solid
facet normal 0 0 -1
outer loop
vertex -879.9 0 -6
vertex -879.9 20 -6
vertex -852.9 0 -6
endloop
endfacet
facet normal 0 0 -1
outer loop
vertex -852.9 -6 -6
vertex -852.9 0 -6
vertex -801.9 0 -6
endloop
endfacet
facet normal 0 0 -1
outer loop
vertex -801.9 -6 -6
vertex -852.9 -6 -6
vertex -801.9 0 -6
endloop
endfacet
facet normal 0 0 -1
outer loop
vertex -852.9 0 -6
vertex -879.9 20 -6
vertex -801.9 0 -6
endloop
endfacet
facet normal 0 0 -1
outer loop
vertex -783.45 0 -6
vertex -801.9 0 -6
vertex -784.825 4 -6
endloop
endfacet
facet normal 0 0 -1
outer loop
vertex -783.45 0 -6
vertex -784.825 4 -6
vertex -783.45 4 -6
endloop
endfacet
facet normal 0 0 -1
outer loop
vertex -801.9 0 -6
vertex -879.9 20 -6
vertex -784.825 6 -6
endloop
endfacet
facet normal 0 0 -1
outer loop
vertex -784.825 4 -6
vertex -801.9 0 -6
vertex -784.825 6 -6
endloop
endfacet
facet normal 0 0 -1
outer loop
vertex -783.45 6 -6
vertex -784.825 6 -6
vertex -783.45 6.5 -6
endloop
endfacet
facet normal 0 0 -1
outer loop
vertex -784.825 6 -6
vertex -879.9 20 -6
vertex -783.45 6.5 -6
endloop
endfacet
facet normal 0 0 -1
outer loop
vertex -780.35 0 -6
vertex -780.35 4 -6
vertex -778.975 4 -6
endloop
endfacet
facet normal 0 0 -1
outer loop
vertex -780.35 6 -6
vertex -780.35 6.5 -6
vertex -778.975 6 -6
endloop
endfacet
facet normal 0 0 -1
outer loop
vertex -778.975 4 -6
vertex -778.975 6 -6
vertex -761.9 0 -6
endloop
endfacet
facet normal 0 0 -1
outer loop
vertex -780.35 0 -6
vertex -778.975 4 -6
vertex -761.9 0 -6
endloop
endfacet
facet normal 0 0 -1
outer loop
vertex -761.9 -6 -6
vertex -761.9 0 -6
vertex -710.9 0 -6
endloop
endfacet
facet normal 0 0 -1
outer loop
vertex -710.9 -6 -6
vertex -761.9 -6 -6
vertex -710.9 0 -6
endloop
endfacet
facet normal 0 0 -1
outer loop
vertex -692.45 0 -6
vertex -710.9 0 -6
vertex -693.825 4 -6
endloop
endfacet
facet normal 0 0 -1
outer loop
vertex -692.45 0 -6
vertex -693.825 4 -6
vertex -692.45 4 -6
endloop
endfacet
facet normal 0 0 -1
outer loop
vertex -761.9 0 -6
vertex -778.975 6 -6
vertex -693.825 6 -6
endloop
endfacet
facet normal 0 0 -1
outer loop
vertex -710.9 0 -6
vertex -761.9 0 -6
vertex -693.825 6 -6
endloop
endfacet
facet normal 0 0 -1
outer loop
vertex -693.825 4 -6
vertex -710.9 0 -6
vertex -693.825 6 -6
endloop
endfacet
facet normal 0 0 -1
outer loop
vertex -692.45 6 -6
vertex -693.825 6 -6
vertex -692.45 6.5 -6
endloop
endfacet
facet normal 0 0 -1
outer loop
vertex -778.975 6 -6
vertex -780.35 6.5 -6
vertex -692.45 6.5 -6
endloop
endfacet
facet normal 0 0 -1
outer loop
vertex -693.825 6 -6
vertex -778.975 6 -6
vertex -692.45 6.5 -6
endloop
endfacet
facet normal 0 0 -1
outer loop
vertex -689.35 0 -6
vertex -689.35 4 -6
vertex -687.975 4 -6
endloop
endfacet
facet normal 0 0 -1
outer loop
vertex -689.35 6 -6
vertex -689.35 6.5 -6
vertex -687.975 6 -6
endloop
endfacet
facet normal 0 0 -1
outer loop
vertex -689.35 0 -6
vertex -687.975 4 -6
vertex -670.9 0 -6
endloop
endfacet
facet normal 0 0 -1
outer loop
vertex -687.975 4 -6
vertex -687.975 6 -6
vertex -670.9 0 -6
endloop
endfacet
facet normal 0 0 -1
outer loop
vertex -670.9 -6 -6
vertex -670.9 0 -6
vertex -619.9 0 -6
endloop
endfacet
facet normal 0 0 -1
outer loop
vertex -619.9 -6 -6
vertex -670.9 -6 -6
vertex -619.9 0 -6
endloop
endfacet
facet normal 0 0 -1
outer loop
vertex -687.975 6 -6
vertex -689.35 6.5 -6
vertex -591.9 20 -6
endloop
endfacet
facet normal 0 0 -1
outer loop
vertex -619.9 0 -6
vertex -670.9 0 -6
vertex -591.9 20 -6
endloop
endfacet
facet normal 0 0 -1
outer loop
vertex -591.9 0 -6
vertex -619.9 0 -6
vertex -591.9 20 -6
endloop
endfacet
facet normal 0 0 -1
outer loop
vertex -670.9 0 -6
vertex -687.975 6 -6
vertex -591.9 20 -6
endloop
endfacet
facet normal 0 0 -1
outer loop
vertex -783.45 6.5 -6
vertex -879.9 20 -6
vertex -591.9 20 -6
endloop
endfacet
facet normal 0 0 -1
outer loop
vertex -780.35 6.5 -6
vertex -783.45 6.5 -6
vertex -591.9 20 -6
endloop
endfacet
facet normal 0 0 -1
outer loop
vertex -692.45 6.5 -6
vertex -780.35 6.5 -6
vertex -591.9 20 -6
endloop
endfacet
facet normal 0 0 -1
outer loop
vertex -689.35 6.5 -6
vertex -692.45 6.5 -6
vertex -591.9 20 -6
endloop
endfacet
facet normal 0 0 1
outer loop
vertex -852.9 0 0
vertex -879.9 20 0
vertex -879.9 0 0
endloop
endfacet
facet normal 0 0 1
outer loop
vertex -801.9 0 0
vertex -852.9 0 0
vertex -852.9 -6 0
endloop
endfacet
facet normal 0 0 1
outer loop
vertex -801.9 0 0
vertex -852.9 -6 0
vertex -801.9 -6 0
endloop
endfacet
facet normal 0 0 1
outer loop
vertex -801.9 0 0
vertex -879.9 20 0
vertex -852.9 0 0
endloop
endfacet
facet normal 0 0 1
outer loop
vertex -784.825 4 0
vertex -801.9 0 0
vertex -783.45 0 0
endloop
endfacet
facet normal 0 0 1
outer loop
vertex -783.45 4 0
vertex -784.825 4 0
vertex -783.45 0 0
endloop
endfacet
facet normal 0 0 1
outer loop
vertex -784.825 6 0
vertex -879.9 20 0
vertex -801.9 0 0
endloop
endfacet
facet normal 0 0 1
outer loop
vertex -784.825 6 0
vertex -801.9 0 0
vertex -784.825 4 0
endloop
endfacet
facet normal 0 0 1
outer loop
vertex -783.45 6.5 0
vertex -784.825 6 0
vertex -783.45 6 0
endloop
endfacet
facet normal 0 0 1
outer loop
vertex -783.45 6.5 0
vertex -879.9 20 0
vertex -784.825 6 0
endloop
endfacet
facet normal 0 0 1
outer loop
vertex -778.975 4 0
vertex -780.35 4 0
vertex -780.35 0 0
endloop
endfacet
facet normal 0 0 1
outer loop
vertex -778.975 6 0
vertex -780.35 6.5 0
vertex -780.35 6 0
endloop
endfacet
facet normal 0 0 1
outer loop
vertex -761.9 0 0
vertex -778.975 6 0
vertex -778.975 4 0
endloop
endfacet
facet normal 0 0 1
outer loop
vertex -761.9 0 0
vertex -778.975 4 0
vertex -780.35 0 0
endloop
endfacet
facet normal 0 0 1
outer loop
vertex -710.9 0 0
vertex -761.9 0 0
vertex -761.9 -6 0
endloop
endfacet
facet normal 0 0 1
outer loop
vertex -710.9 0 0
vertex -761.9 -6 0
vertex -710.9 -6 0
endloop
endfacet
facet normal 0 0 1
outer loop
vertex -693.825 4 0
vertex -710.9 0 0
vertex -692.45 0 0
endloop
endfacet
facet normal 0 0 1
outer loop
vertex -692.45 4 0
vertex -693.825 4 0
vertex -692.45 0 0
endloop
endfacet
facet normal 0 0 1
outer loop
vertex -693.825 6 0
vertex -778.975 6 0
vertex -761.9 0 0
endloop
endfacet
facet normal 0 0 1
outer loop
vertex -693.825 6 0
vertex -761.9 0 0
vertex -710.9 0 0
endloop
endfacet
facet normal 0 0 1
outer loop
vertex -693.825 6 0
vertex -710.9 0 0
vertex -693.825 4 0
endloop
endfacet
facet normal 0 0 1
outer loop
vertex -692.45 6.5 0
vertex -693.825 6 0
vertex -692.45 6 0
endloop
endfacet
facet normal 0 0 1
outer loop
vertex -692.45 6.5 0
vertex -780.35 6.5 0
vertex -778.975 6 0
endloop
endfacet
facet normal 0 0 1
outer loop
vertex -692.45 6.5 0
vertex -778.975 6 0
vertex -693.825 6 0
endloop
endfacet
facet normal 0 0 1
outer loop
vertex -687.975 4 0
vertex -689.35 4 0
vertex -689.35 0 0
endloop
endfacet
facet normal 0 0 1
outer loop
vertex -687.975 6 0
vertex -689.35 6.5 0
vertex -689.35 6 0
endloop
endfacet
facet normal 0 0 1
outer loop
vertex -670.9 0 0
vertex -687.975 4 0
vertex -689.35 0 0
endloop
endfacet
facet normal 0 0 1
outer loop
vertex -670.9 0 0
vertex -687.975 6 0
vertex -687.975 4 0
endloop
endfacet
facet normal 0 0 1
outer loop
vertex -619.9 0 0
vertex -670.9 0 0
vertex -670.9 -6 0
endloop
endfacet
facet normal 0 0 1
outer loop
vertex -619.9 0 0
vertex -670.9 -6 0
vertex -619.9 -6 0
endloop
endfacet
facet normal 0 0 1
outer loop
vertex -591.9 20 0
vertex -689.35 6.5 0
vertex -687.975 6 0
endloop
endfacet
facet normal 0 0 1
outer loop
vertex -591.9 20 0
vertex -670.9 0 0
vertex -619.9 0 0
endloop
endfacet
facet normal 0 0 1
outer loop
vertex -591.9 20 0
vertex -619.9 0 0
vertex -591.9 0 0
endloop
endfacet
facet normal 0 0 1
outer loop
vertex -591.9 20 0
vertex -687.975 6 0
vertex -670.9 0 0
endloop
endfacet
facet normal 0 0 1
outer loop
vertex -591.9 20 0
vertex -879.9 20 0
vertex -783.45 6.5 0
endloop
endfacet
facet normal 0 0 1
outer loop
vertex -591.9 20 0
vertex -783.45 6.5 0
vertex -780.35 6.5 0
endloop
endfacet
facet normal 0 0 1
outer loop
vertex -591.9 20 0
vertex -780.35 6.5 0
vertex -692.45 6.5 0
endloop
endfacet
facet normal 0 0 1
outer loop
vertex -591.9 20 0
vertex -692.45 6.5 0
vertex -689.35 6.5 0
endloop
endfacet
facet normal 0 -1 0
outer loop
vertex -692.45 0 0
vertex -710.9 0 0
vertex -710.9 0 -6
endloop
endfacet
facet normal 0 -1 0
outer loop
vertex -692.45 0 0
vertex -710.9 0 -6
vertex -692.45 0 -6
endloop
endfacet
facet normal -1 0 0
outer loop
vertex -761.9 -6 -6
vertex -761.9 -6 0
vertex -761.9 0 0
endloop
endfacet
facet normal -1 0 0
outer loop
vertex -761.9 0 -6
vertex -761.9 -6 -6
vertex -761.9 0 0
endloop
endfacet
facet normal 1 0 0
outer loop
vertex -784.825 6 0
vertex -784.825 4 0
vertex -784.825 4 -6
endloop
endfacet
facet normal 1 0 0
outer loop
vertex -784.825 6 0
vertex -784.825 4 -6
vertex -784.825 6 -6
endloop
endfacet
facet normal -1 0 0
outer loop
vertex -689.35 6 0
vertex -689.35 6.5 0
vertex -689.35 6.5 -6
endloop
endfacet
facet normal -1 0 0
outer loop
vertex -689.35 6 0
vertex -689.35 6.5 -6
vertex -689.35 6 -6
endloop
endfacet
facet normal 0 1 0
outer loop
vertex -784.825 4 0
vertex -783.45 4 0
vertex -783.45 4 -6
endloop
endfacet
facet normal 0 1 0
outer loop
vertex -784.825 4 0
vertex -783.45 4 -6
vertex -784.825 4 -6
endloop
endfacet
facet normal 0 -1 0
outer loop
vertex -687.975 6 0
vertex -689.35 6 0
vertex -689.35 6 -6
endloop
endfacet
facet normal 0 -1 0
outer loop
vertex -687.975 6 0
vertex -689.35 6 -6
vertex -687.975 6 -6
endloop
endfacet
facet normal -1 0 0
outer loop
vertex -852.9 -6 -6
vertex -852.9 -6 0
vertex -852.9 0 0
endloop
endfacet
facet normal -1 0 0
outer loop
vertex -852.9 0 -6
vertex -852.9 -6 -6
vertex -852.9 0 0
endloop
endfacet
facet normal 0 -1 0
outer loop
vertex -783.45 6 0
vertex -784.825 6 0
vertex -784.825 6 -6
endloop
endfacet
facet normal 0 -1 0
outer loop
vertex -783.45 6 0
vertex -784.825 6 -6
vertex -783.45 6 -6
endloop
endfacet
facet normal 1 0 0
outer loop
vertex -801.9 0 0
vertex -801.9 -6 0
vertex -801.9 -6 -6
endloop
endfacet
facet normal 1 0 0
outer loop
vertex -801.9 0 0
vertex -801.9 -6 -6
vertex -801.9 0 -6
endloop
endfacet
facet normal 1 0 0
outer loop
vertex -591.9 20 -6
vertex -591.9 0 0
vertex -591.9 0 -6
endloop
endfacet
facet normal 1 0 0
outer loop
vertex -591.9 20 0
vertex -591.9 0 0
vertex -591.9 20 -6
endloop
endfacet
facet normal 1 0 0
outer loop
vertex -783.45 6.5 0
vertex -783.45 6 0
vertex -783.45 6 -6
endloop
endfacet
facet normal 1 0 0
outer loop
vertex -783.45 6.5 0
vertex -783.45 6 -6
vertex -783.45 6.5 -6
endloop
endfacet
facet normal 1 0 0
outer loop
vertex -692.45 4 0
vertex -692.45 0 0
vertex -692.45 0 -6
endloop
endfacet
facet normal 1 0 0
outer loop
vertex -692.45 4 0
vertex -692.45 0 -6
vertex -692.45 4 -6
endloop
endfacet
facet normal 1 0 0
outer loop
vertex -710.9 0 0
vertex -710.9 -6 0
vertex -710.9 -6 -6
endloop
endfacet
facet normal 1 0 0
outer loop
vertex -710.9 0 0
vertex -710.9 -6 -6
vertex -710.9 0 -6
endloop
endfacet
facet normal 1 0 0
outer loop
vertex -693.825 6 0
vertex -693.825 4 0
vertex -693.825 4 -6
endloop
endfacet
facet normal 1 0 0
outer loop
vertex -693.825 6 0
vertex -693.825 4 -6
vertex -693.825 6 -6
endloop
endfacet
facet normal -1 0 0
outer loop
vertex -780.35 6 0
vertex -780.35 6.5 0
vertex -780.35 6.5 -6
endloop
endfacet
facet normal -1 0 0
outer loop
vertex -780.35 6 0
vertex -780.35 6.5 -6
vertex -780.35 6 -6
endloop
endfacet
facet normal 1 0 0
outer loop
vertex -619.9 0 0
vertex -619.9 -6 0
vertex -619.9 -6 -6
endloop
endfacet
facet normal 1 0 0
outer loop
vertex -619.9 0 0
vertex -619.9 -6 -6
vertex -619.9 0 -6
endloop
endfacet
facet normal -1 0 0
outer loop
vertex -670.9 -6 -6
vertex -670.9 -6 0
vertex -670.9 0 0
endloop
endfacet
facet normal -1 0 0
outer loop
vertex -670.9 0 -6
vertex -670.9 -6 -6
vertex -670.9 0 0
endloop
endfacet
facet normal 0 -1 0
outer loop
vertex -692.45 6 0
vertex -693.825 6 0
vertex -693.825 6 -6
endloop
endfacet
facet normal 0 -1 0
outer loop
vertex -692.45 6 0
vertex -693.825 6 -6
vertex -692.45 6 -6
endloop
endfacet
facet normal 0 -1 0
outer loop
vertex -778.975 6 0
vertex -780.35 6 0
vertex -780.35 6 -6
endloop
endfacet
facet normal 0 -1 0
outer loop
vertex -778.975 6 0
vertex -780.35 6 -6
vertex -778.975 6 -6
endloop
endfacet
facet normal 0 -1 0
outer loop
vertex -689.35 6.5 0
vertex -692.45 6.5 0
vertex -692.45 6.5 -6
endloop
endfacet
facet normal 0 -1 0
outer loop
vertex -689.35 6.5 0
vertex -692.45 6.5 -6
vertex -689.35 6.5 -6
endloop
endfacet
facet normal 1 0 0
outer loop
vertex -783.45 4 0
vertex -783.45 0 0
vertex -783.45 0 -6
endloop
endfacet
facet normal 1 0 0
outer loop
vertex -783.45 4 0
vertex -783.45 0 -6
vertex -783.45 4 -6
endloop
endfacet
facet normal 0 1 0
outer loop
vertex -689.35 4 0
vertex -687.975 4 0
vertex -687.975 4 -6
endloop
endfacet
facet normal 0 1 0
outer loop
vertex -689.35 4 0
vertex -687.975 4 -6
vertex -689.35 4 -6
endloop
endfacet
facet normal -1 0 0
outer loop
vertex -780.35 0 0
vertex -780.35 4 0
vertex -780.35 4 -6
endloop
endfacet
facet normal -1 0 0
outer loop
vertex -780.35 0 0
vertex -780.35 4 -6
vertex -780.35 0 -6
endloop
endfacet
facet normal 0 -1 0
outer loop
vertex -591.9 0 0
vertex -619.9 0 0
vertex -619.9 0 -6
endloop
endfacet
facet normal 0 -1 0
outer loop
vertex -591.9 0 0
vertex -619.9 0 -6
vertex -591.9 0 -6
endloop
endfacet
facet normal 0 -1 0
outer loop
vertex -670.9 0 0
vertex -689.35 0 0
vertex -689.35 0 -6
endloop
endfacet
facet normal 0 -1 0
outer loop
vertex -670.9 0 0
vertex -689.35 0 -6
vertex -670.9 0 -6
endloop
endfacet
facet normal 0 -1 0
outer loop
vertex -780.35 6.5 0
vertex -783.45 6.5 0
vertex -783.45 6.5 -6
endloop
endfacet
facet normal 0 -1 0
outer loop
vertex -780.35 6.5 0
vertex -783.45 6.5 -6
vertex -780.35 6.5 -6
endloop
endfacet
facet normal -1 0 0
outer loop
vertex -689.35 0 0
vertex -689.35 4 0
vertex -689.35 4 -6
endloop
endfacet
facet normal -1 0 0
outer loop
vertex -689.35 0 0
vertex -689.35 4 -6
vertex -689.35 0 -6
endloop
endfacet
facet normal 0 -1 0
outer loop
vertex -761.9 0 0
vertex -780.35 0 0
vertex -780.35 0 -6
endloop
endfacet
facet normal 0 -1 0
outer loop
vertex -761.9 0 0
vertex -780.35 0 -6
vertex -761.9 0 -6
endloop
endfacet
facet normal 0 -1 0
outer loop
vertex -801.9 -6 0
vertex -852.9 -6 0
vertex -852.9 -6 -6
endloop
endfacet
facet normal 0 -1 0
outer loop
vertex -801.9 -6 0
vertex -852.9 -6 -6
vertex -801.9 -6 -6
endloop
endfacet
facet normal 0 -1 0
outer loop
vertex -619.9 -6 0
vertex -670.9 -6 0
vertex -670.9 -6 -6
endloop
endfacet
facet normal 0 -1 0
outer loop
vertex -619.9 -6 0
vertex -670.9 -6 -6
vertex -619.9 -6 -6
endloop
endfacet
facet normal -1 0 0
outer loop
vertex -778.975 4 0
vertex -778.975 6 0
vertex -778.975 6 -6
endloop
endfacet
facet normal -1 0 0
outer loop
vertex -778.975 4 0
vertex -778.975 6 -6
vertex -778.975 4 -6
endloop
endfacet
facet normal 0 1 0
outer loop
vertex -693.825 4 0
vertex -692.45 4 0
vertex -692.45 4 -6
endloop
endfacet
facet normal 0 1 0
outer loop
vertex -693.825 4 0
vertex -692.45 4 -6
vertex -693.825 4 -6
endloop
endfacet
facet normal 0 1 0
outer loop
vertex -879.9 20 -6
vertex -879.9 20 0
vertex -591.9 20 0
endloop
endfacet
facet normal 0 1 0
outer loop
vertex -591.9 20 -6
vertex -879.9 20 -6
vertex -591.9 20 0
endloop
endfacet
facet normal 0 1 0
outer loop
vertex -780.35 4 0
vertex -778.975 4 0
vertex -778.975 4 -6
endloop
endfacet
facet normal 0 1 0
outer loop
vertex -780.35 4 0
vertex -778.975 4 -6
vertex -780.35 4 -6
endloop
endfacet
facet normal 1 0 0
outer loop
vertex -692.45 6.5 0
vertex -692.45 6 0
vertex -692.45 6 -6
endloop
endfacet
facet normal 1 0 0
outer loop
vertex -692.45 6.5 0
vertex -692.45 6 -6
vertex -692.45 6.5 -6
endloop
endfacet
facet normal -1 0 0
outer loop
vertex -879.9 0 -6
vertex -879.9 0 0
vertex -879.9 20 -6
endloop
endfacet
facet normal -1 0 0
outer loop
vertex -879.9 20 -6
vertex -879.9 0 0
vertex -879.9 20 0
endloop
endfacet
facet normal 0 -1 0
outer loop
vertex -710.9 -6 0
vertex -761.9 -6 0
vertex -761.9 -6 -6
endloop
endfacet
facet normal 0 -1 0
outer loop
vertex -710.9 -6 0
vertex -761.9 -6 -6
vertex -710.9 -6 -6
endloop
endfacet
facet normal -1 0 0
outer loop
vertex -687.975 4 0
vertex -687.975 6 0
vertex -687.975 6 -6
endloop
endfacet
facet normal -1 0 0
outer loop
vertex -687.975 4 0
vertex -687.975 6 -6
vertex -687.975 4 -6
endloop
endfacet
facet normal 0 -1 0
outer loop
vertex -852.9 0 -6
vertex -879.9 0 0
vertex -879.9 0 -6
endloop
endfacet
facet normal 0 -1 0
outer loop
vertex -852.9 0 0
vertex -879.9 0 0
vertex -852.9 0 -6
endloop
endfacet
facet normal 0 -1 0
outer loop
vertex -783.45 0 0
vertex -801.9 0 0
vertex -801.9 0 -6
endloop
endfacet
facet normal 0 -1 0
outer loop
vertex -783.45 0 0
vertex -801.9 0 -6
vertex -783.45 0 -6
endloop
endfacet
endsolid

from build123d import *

# Parameters (mm, degrees)
SZKIC1_W                    = 288
SZKIC1_H                    = 26
DODANIE_WYCI_GNI_CIE1_DEPTH = 6
SZKIC5_W                    = 40
SZKIC5_H                    = 6
WYTNIJ_WYCI_GNI_CIE3_DEPTH  = 6
SZYK_LINIOWY1_COUNT         = 4
SZYK_LINIOWY1_PITCH         = 91
WYTNIJ_WYCI_GNI_CIE4_DEPTH  = 6
SZYK_LINIOWY2_COUNT         = 2
SZYK_LINIOWY2_PITCH         = 91


with BuildPart() as part:
    # Szkic1 → Dodanie-wyciągnięcie1 (new body)
    with BuildSketch(Plane.XY):
        with Locations((-735.9, 7)):
            Rectangle(SZKIC1_W, SZKIC1_H)
    extrude(amount=-DODANIE_WYCI_GNI_CIE1_DEPTH)

    # Szkic5 → Wytnij-wyciągnięcie3 (cut)
    with BuildSketch(Plane.XY):
        with Locations((-872.9, -3)):
            Rectangle(SZKIC5_W, SZKIC5_H)
    wytnij_wyci_gni_cie3 = extrude(amount=-WYTNIJ_WYCI_GNI_CIE3_DEPTH, mode=Mode.SUBTRACT)

    # Szyk liniowy1: Wytnij-wyciągnięcie3 ×4
    with Locations(*[(i * SZYK_LINIOWY1_PITCH, 0, 0) for i in range(1, SZYK_LINIOWY1_COUNT)]):
        add(wytnij_wyci_gni_cie3, mode=Mode.SUBTRACT)

    # Szkic6 → Wytnij-wyciągnięcie4 (cut)
    with BuildSketch(Plane.XY):
        Polygon((-780.35, 0), (-783.45, 0), (-783.45, 4), (-784.825, 4), (-784.825, 6), (-783.45, 6), (-783.45, 6.5), (-780.35, 6.5), (-780.35, 6), (-778.975, 6), (-778.975, 4), (-780.35, 4), align=None)
    wytnij_wyci_gni_cie4 = extrude(amount=-WYTNIJ_WYCI_GNI_CIE4_DEPTH, mode=Mode.SUBTRACT)

    # Szyk liniowy2: Wytnij-wyciągnięcie4 ×2
    with Locations(*[(i * SZYK_LINIOWY2_PITCH, 0, 0) for i in range(1, SZYK_LINIOWY2_COUNT)]):
        add(wytnij_wyci_gni_cie4, mode=Mode.SUBTRACT)


solid = part.part
